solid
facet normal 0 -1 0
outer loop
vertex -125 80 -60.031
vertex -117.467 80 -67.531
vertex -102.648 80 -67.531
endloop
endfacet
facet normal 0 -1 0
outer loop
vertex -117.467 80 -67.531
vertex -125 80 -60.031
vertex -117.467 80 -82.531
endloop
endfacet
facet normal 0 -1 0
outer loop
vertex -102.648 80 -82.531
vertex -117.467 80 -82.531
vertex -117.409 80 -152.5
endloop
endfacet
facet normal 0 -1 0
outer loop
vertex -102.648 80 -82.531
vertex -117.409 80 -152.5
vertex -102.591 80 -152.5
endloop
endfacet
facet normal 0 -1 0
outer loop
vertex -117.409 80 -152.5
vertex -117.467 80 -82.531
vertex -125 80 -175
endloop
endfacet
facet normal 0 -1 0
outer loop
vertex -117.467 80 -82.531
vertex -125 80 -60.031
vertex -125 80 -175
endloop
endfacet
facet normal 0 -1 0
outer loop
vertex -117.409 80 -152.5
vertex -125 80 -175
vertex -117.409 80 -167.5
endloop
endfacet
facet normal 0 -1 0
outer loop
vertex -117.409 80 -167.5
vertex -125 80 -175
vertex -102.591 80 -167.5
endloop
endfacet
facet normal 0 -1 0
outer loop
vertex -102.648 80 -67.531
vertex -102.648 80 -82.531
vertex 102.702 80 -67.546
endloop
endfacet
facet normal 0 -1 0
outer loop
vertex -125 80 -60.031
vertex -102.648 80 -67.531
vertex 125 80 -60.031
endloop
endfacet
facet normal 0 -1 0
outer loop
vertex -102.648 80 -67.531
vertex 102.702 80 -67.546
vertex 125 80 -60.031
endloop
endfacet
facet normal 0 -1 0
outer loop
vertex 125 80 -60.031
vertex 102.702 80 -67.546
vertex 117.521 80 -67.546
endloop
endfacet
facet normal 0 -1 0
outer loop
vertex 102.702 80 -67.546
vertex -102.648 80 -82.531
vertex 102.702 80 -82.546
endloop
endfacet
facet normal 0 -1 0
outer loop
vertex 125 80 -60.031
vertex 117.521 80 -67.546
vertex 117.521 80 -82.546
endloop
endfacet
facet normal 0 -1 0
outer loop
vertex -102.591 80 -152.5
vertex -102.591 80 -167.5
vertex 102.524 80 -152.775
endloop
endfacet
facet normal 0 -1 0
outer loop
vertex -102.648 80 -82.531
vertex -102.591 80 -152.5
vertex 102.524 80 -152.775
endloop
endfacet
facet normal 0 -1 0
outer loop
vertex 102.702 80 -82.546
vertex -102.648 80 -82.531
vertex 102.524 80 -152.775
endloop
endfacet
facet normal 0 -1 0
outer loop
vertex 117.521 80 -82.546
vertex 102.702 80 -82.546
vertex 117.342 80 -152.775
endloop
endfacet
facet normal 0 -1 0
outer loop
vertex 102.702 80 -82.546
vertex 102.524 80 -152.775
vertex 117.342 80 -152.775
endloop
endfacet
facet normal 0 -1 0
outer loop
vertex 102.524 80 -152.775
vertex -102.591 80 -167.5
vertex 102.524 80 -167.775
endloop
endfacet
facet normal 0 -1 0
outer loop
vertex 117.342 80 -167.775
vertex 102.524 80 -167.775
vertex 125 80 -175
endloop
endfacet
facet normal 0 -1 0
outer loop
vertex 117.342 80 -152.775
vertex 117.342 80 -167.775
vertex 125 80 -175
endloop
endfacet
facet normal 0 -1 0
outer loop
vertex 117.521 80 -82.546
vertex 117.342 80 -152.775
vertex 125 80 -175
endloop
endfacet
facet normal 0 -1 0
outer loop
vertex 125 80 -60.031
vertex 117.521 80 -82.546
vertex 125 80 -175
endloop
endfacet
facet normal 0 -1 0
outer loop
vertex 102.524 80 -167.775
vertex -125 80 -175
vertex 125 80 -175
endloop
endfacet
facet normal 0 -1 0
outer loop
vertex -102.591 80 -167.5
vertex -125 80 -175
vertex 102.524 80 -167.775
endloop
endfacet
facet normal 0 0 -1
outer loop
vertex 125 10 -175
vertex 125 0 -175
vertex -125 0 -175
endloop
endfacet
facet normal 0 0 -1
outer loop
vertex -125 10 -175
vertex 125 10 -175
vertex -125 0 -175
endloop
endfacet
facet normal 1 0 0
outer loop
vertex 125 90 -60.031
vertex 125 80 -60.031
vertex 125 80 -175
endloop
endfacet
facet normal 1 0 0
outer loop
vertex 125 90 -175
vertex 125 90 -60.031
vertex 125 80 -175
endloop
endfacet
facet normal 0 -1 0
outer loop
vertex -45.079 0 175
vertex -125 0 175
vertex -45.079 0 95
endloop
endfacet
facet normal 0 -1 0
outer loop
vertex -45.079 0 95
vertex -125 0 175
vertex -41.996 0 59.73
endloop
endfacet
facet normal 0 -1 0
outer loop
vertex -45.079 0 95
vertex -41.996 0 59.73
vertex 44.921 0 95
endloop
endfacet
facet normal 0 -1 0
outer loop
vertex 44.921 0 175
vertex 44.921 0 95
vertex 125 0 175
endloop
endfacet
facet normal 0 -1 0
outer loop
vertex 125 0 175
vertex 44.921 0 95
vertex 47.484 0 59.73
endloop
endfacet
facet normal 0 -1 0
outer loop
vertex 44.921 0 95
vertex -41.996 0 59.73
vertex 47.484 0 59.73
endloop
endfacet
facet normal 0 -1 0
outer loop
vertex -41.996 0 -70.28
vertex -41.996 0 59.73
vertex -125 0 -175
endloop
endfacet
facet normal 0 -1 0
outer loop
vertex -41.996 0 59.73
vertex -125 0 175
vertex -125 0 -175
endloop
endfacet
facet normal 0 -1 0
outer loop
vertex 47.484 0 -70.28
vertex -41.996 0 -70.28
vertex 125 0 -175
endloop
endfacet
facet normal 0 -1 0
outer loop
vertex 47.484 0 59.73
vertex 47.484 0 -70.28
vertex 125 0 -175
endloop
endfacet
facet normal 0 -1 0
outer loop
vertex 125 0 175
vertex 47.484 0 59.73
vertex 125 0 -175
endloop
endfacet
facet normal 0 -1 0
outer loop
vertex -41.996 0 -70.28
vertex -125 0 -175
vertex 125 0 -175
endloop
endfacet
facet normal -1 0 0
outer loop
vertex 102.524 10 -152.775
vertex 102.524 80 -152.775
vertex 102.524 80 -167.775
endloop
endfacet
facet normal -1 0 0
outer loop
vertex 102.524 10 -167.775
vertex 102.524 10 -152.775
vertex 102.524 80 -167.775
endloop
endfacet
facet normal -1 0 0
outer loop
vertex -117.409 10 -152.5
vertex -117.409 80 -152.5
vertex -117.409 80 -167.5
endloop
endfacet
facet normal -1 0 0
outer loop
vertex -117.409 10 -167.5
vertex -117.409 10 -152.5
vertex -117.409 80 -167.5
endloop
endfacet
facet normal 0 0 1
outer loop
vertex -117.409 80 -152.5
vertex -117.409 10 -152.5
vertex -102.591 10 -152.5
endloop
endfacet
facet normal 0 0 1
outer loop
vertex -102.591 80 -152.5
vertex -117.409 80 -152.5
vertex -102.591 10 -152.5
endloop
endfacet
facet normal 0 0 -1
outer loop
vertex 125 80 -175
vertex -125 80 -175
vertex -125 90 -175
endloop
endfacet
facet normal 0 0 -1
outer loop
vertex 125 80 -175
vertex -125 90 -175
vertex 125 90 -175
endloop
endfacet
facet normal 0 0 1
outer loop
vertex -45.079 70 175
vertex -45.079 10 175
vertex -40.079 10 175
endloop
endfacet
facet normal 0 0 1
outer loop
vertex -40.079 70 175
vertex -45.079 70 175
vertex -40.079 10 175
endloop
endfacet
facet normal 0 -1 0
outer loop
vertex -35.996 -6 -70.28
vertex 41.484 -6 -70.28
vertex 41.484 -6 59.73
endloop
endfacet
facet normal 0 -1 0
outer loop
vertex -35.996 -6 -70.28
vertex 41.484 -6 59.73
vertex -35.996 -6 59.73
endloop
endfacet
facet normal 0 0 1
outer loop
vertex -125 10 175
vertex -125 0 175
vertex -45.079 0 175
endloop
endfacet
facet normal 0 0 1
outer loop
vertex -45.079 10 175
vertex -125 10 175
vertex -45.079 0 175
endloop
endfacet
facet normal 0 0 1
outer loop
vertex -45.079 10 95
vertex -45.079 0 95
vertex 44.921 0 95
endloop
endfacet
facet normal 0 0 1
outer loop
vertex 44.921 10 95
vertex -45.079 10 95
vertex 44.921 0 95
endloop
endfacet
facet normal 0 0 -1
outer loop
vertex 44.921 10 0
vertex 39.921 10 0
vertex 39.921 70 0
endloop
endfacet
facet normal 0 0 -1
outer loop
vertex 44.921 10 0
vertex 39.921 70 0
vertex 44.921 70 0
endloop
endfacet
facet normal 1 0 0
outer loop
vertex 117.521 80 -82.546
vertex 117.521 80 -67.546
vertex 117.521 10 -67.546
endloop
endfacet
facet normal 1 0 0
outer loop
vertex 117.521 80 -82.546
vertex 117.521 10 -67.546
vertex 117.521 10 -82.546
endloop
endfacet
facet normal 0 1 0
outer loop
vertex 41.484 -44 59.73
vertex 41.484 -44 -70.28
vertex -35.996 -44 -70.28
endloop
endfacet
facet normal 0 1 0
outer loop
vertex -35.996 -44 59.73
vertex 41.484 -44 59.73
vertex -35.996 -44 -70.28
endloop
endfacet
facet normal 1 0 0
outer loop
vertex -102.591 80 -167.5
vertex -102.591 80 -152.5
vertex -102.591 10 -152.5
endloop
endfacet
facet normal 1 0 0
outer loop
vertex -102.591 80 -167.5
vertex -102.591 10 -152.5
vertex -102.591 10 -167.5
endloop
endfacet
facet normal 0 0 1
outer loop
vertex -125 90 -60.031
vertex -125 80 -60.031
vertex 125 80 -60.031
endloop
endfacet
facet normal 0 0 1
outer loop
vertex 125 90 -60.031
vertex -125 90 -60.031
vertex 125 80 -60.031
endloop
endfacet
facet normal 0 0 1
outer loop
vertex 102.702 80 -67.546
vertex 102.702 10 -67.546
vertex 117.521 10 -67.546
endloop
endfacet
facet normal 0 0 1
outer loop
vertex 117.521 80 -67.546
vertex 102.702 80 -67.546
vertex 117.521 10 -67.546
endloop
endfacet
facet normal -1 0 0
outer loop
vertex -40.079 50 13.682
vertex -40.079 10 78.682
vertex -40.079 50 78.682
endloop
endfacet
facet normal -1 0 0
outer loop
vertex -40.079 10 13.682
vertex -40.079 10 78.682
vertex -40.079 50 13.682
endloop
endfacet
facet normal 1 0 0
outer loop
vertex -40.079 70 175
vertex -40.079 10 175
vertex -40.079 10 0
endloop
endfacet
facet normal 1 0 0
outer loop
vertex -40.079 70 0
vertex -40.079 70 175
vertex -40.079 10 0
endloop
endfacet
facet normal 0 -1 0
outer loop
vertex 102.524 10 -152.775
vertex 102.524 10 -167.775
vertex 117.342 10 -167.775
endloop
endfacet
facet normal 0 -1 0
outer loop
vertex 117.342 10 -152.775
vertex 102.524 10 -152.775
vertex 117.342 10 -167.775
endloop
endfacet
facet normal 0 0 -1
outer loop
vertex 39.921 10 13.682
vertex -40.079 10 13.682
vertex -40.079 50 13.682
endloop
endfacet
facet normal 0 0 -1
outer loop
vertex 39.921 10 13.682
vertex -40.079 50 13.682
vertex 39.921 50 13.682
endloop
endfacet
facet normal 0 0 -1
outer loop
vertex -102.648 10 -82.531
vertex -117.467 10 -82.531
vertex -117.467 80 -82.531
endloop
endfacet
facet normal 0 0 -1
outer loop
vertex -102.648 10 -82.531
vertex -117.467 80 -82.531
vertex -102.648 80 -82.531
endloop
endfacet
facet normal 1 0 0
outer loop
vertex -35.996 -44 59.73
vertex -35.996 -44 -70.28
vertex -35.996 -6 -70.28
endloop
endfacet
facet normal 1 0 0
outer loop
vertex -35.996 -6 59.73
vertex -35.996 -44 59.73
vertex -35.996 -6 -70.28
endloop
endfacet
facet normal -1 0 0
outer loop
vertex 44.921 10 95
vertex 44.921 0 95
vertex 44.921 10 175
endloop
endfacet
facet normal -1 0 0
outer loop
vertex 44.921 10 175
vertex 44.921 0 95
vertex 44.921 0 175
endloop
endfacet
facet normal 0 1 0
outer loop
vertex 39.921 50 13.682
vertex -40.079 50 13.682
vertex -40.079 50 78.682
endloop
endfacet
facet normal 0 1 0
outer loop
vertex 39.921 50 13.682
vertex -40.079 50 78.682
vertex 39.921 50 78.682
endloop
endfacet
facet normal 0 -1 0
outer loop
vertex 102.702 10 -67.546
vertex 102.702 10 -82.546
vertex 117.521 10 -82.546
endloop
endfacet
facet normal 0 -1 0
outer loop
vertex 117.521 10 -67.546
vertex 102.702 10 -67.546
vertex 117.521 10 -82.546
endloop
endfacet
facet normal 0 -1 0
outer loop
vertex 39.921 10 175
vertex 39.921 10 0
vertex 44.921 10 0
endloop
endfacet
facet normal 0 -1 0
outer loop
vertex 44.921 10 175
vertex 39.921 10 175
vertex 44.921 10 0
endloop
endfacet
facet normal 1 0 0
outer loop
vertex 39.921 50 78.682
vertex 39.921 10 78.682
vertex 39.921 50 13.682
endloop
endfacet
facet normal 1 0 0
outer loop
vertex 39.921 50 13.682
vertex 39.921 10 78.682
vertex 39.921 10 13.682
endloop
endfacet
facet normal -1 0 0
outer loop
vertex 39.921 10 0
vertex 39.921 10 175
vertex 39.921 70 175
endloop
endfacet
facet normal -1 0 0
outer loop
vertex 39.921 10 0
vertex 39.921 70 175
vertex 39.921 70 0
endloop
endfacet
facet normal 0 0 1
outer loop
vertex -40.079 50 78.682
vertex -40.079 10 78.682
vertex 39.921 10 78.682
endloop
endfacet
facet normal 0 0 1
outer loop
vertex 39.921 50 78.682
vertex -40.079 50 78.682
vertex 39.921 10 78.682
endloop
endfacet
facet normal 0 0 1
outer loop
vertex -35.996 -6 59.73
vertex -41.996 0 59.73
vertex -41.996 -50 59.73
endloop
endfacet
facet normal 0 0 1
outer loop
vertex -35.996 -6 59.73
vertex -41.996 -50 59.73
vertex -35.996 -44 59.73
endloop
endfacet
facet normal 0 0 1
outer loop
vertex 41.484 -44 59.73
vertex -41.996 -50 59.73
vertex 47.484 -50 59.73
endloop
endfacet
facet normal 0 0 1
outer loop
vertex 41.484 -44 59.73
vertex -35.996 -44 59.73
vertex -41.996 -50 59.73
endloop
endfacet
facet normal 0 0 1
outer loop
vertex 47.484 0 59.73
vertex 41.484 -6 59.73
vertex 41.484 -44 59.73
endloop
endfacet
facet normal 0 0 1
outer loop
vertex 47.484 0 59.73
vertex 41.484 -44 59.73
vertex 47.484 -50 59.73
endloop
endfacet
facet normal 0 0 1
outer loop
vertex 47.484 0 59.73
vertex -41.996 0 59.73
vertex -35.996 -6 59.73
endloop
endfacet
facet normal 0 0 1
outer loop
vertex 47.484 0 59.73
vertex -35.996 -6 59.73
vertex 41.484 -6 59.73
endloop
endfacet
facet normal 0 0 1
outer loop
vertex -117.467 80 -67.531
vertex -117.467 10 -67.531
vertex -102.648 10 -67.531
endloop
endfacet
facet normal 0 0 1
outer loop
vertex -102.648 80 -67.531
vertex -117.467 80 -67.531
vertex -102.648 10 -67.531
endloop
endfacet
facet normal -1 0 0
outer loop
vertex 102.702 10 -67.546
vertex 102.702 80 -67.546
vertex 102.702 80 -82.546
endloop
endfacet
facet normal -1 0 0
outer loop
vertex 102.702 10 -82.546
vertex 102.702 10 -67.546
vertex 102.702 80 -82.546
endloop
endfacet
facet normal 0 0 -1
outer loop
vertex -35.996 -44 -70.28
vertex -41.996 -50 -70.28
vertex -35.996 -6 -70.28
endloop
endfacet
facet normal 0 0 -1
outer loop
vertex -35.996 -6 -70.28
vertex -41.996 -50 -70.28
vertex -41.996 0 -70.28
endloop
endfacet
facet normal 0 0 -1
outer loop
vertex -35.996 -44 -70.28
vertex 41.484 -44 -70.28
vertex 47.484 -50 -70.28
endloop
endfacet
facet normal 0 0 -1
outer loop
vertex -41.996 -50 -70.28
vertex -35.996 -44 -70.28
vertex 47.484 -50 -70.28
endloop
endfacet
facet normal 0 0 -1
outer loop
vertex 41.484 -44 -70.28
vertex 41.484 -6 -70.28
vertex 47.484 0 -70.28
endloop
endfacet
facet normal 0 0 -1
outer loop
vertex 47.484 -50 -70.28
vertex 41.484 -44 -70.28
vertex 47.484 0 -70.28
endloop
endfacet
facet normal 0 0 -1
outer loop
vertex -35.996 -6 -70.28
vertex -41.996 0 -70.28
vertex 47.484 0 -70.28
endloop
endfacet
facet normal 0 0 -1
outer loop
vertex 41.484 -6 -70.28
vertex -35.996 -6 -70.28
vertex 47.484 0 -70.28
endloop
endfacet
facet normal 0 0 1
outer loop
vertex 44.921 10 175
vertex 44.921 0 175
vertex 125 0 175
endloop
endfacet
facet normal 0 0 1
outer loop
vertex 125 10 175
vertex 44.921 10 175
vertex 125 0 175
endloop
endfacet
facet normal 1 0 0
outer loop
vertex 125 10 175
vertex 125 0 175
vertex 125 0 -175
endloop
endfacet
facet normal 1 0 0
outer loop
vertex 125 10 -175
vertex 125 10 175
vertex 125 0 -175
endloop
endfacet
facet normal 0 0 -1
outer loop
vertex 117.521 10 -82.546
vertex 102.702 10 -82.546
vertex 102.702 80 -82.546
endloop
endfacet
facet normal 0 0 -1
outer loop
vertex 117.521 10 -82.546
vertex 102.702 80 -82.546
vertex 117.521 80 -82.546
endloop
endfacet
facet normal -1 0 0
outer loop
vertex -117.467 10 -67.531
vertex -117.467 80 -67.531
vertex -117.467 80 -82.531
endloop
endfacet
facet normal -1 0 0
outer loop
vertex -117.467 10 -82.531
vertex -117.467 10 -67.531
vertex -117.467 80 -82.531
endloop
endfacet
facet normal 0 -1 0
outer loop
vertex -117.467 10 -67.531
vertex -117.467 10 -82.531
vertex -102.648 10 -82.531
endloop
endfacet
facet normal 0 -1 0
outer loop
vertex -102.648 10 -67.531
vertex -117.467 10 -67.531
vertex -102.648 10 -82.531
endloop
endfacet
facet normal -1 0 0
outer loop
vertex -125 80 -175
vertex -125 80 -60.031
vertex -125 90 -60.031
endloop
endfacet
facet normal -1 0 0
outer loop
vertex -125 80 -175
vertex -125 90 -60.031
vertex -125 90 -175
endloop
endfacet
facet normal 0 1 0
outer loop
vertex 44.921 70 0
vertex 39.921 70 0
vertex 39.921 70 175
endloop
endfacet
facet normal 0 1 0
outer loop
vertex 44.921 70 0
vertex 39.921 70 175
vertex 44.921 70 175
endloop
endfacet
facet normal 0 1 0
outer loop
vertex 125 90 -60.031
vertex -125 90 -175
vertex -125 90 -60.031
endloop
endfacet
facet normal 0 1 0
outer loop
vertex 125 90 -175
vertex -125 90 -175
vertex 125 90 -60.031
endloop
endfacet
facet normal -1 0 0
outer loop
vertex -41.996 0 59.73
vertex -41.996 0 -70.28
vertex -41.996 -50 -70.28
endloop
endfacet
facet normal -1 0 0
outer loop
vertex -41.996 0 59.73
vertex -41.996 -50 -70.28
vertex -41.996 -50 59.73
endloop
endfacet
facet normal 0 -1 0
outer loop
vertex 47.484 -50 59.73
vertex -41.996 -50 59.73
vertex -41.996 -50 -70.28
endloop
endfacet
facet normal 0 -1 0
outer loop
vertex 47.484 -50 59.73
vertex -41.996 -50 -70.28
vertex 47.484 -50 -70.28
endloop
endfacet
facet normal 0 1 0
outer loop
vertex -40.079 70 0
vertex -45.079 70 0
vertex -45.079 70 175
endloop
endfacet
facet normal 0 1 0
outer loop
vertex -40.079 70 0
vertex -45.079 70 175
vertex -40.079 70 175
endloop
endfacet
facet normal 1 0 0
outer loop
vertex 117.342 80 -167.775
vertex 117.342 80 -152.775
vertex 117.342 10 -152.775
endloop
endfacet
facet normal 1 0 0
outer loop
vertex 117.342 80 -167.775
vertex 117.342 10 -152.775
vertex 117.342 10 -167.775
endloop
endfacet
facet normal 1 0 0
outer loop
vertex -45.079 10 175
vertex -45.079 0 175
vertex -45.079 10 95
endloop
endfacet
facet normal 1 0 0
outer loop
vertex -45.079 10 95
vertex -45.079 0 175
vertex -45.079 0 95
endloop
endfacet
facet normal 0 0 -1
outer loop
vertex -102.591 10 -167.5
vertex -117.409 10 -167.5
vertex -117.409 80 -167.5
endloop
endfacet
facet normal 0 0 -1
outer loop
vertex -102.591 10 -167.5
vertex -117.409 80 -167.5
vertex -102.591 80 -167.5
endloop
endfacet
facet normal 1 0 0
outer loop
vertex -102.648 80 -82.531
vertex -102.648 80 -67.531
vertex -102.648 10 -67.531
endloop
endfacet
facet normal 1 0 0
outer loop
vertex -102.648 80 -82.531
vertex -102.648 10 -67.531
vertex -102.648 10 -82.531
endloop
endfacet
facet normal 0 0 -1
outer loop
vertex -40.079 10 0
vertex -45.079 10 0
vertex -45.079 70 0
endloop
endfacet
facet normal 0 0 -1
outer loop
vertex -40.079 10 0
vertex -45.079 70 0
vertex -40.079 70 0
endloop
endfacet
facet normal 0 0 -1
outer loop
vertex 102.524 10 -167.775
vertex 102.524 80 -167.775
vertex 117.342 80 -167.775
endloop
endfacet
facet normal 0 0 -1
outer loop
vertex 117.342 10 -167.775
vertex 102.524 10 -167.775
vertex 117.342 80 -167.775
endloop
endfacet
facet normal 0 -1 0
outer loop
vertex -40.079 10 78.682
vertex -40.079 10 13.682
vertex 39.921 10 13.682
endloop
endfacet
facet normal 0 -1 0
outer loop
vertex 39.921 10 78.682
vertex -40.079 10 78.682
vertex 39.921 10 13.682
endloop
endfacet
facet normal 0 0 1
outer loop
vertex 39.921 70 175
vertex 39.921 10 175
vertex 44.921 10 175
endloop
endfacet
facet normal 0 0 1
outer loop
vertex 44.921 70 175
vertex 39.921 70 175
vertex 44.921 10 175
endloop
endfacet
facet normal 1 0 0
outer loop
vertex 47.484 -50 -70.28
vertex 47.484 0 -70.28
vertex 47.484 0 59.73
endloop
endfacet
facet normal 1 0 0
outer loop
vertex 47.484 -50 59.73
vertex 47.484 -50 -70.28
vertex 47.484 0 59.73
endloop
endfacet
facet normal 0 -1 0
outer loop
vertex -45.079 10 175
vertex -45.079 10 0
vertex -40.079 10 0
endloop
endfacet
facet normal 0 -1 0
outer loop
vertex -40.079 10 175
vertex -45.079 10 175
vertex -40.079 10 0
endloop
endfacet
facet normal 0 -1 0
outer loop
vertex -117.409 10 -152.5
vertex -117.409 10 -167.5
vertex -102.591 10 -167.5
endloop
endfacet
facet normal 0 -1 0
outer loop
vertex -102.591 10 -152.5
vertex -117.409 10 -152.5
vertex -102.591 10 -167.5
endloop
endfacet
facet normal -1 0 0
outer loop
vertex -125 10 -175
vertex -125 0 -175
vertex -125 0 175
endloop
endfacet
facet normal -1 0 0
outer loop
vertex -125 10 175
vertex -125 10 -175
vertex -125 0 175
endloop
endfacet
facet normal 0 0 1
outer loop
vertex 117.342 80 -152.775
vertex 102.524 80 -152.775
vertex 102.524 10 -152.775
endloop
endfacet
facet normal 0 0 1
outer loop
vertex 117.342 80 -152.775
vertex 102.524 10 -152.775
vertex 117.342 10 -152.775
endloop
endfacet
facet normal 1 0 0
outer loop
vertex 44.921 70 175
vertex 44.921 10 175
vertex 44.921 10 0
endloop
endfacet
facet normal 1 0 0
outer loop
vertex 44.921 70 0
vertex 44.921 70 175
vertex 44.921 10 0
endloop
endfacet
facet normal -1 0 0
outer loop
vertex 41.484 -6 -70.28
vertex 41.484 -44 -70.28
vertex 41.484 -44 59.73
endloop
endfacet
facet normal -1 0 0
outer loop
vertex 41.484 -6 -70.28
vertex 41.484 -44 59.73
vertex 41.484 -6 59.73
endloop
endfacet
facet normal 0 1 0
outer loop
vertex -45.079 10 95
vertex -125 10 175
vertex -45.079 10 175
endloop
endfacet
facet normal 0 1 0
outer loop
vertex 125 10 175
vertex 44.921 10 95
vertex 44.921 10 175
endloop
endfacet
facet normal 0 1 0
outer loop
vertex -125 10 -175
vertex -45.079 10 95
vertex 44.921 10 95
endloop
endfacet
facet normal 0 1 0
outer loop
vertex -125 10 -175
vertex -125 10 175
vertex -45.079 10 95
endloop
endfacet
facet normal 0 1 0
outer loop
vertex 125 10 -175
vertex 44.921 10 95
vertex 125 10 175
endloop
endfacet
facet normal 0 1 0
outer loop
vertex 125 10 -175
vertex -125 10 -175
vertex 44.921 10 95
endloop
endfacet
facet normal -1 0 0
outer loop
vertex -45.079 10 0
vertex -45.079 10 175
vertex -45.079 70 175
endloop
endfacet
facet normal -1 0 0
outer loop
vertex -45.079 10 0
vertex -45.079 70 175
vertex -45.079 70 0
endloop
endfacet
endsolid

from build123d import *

# Parameters (mm, degrees)
BOSS_EXTRUDE1_DEPTH   = 10
SKETCH3_W             = 5
SKETCH3_H             = 175
BOSS_EXTRUDE3_DEPTH   = 60
BOSS_EXTRUDE3_2_DEPTH = 60
SKETCH4_W             = 80
SKETCH4_H             = 65
BOSS_EXTRUDE4_DEPTH   = 70
SKETCH4_W_2           = 14.818270304
SKETCH4_H_2           = 15
BOSS_EXTRUDE4_2_DEPTH = 70
BOSS_EXTRUDE4_3_DEPTH = 70
SKETCH4_W_3           = 14.818270303
BOSS_EXTRUDE4_4_DEPTH = 70
BOSS_EXTRUDE4_5_DEPTH = 70
SKETCH5_W             = 80
SKETCH5_H             = 65
CUT_EXTRUDE1_DEPTH    = 30
SKETCH6_W             = 250
SKETCH6_H             = 114.969361411
BOSS_EXTRUDE5_DEPTH   = 10
SKETCH7_W             = 89.480070442
SKETCH7_H             = 130.009753393
BOSS_EXTRUDE6_DEPTH   = 50
SKETCH8_W             = 77.480070442
SKETCH8_H             = 38
CUT_EXTRUDE4_DEPTH    = 246.280237845


with BuildPart() as part:
    # Sketch2 → Boss-Extrude1 (new body)
    with BuildSketch(Plane(origin=(0, 0, 0), x_dir=(1, 0, 0), z_dir=(0, 1, 0))):
        Polygon((125, 175), (-125, 175), (-125, -175), (-45.078787682, -175), (-45.078787682, -95), (44.921212318, -95), (44.921212318, -175), (44.965173676, -175), (125, -175), align=None)
    extrude(amount=BOSS_EXTRUDE1_DEPTH)

    # Sketch7 → Boss-Extrude6 (add)
    with BuildSketch(Plane.XZ):
        with Locations((2.744175311, -5.275361149)):
            Rectangle(SKETCH7_W, SKETCH7_H)
    extrude(amount=BOSS_EXTRUDE6_DEPTH)

    # Sketch8 → Cut-Extrude4 (cut, through all)
    with BuildSketch(Plane(origin=(0, 0, -70.280237845), x_dir=(-1, 0, 0), z_dir=(0, 0, -1))):
        with Locations((-2.744175311, -25)):
            Rectangle(SKETCH8_W, SKETCH8_H)
    extrude(amount=-CUT_EXTRUDE4_DEPTH, mode=Mode.SUBTRACT)


with BuildPart() as body_2:
    # Sketch3 → Boss-Extrude3 (new body)
    with BuildSketch(Plane(origin=(0, 10, 0), x_dir=(1, 0, 0), z_dir=(0, 1, 0))):
        with Locations((-42.578787682, -87.5)):
            Rectangle(SKETCH3_W, SKETCH3_H)
    extrude(amount=BOSS_EXTRUDE3_DEPTH)


with BuildPart() as body_3:
    # Sketch3 → Boss-Extrude3 2 (new body)
    with BuildSketch(Plane(origin=(0, 10, 0), x_dir=(1, 0, 0), z_dir=(0, 1, 0))):
        with Locations((42.421212318, -87.5)):
            Rectangle(SKETCH3_W, SKETCH3_H)
    extrude(amount=BOSS_EXTRUDE3_2_DEPTH)


with BuildPart() as body_4:
    # Sketch4 → Boss-Extrude4 (new body)
    with BuildSketch(Plane(origin=(0, 10, 0), x_dir=(1, 0, 0), z_dir=(0, 1, 0))):
        with Locations((-0.078787682, -46.182156377)):
            Rectangle(SKETCH4_W, SKETCH4_H)
    extrude(amount=BOSS_EXTRUDE4_DEPTH)

    # Sketch5 → Cut-Extrude1 (cut)
    with BuildSketch(Plane(origin=(0, 80, 0), x_dir=(1, 0, 0), z_dir=(0, 1, 0))):
        with Locations((-0.078787682, -46.182156377)):
            Rectangle(SKETCH5_W, SKETCH5_H)
    extrude(amount=-CUT_EXTRUDE1_DEPTH, mode=Mode.SUBTRACT)


with BuildPart() as body_5:
    # Sketch4 → Boss-Extrude4 2 (new body)
    with BuildSketch(Plane(origin=(0, 10, 0), x_dir=(1, 0, 0), z_dir=(0, 1, 0))):
        with Locations((-110, 160)):
            Rectangle(SKETCH4_W_2, SKETCH4_H_2)
    extrude(amount=BOSS_EXTRUDE4_2_DEPTH)



with BuildPart() as body_6:
    # Sketch4 → Boss-Extrude4 3 (new body)
    with BuildSketch(Plane(origin=(0, 10, 0), x_dir=(1, 0, 0), z_dir=(0, 1, 0))):
        with Locations((-110.057576569, 75.030638589)):
            Rectangle(SKETCH4_W_2, SKETCH4_H_2)
    extrude(amount=BOSS_EXTRUDE4_3_DEPTH)


with BuildPart() as body_7:
    # Sketch4 → Boss-Extrude4 4 (new body)
    with BuildSketch(Plane(origin=(0, 10, 0), x_dir=(1, 0, 0), z_dir=(0, 1, 0))):
        with Locations((109.933142223, 160.27452831)):
            Rectangle(SKETCH4_W_3, SKETCH4_H_2)
    extrude(amount=BOSS_EXTRUDE4_4_DEPTH)


with BuildPart() as body_8:
    # Sketch4 → Boss-Extrude4 5 (new body)
    with BuildSketch(Plane(origin=(0, 10, 0), x_dir=(1, 0, 0), z_dir=(0, 1, 0))):
        with Locations((110.111370806, 75.046426768)):
            Rectangle(SKETCH4_W_2, SKETCH4_H_2)
    extrude(amount=BOSS_EXTRUDE4_5_DEPTH)


with BuildPart() as body_5_1:
    add(body_5.part)

    add(body_6.part)  # Boss-Extrude5 merges body 6

    add(body_7.part)  # Boss-Extrude5 merges body 7

    add(body_8.part)  # Boss-Extrude5 merges body 8
    # Sketch6 → Boss-Extrude5 (add)
    with BuildSketch(Plane(origin=(0, 80, 0), x_dir=(1, 0, 0), z_dir=(0, 1, 0))):
        with Locations((0, 117.515319295)):
            Rectangle(SKETCH6_W, SKETCH6_H)
    extrude(amount=BOSS_EXTRUDE5_DEPTH)


solid = Compound([part.part, body_2.part, body_3.part, body_4.part, body_5_1.part])
